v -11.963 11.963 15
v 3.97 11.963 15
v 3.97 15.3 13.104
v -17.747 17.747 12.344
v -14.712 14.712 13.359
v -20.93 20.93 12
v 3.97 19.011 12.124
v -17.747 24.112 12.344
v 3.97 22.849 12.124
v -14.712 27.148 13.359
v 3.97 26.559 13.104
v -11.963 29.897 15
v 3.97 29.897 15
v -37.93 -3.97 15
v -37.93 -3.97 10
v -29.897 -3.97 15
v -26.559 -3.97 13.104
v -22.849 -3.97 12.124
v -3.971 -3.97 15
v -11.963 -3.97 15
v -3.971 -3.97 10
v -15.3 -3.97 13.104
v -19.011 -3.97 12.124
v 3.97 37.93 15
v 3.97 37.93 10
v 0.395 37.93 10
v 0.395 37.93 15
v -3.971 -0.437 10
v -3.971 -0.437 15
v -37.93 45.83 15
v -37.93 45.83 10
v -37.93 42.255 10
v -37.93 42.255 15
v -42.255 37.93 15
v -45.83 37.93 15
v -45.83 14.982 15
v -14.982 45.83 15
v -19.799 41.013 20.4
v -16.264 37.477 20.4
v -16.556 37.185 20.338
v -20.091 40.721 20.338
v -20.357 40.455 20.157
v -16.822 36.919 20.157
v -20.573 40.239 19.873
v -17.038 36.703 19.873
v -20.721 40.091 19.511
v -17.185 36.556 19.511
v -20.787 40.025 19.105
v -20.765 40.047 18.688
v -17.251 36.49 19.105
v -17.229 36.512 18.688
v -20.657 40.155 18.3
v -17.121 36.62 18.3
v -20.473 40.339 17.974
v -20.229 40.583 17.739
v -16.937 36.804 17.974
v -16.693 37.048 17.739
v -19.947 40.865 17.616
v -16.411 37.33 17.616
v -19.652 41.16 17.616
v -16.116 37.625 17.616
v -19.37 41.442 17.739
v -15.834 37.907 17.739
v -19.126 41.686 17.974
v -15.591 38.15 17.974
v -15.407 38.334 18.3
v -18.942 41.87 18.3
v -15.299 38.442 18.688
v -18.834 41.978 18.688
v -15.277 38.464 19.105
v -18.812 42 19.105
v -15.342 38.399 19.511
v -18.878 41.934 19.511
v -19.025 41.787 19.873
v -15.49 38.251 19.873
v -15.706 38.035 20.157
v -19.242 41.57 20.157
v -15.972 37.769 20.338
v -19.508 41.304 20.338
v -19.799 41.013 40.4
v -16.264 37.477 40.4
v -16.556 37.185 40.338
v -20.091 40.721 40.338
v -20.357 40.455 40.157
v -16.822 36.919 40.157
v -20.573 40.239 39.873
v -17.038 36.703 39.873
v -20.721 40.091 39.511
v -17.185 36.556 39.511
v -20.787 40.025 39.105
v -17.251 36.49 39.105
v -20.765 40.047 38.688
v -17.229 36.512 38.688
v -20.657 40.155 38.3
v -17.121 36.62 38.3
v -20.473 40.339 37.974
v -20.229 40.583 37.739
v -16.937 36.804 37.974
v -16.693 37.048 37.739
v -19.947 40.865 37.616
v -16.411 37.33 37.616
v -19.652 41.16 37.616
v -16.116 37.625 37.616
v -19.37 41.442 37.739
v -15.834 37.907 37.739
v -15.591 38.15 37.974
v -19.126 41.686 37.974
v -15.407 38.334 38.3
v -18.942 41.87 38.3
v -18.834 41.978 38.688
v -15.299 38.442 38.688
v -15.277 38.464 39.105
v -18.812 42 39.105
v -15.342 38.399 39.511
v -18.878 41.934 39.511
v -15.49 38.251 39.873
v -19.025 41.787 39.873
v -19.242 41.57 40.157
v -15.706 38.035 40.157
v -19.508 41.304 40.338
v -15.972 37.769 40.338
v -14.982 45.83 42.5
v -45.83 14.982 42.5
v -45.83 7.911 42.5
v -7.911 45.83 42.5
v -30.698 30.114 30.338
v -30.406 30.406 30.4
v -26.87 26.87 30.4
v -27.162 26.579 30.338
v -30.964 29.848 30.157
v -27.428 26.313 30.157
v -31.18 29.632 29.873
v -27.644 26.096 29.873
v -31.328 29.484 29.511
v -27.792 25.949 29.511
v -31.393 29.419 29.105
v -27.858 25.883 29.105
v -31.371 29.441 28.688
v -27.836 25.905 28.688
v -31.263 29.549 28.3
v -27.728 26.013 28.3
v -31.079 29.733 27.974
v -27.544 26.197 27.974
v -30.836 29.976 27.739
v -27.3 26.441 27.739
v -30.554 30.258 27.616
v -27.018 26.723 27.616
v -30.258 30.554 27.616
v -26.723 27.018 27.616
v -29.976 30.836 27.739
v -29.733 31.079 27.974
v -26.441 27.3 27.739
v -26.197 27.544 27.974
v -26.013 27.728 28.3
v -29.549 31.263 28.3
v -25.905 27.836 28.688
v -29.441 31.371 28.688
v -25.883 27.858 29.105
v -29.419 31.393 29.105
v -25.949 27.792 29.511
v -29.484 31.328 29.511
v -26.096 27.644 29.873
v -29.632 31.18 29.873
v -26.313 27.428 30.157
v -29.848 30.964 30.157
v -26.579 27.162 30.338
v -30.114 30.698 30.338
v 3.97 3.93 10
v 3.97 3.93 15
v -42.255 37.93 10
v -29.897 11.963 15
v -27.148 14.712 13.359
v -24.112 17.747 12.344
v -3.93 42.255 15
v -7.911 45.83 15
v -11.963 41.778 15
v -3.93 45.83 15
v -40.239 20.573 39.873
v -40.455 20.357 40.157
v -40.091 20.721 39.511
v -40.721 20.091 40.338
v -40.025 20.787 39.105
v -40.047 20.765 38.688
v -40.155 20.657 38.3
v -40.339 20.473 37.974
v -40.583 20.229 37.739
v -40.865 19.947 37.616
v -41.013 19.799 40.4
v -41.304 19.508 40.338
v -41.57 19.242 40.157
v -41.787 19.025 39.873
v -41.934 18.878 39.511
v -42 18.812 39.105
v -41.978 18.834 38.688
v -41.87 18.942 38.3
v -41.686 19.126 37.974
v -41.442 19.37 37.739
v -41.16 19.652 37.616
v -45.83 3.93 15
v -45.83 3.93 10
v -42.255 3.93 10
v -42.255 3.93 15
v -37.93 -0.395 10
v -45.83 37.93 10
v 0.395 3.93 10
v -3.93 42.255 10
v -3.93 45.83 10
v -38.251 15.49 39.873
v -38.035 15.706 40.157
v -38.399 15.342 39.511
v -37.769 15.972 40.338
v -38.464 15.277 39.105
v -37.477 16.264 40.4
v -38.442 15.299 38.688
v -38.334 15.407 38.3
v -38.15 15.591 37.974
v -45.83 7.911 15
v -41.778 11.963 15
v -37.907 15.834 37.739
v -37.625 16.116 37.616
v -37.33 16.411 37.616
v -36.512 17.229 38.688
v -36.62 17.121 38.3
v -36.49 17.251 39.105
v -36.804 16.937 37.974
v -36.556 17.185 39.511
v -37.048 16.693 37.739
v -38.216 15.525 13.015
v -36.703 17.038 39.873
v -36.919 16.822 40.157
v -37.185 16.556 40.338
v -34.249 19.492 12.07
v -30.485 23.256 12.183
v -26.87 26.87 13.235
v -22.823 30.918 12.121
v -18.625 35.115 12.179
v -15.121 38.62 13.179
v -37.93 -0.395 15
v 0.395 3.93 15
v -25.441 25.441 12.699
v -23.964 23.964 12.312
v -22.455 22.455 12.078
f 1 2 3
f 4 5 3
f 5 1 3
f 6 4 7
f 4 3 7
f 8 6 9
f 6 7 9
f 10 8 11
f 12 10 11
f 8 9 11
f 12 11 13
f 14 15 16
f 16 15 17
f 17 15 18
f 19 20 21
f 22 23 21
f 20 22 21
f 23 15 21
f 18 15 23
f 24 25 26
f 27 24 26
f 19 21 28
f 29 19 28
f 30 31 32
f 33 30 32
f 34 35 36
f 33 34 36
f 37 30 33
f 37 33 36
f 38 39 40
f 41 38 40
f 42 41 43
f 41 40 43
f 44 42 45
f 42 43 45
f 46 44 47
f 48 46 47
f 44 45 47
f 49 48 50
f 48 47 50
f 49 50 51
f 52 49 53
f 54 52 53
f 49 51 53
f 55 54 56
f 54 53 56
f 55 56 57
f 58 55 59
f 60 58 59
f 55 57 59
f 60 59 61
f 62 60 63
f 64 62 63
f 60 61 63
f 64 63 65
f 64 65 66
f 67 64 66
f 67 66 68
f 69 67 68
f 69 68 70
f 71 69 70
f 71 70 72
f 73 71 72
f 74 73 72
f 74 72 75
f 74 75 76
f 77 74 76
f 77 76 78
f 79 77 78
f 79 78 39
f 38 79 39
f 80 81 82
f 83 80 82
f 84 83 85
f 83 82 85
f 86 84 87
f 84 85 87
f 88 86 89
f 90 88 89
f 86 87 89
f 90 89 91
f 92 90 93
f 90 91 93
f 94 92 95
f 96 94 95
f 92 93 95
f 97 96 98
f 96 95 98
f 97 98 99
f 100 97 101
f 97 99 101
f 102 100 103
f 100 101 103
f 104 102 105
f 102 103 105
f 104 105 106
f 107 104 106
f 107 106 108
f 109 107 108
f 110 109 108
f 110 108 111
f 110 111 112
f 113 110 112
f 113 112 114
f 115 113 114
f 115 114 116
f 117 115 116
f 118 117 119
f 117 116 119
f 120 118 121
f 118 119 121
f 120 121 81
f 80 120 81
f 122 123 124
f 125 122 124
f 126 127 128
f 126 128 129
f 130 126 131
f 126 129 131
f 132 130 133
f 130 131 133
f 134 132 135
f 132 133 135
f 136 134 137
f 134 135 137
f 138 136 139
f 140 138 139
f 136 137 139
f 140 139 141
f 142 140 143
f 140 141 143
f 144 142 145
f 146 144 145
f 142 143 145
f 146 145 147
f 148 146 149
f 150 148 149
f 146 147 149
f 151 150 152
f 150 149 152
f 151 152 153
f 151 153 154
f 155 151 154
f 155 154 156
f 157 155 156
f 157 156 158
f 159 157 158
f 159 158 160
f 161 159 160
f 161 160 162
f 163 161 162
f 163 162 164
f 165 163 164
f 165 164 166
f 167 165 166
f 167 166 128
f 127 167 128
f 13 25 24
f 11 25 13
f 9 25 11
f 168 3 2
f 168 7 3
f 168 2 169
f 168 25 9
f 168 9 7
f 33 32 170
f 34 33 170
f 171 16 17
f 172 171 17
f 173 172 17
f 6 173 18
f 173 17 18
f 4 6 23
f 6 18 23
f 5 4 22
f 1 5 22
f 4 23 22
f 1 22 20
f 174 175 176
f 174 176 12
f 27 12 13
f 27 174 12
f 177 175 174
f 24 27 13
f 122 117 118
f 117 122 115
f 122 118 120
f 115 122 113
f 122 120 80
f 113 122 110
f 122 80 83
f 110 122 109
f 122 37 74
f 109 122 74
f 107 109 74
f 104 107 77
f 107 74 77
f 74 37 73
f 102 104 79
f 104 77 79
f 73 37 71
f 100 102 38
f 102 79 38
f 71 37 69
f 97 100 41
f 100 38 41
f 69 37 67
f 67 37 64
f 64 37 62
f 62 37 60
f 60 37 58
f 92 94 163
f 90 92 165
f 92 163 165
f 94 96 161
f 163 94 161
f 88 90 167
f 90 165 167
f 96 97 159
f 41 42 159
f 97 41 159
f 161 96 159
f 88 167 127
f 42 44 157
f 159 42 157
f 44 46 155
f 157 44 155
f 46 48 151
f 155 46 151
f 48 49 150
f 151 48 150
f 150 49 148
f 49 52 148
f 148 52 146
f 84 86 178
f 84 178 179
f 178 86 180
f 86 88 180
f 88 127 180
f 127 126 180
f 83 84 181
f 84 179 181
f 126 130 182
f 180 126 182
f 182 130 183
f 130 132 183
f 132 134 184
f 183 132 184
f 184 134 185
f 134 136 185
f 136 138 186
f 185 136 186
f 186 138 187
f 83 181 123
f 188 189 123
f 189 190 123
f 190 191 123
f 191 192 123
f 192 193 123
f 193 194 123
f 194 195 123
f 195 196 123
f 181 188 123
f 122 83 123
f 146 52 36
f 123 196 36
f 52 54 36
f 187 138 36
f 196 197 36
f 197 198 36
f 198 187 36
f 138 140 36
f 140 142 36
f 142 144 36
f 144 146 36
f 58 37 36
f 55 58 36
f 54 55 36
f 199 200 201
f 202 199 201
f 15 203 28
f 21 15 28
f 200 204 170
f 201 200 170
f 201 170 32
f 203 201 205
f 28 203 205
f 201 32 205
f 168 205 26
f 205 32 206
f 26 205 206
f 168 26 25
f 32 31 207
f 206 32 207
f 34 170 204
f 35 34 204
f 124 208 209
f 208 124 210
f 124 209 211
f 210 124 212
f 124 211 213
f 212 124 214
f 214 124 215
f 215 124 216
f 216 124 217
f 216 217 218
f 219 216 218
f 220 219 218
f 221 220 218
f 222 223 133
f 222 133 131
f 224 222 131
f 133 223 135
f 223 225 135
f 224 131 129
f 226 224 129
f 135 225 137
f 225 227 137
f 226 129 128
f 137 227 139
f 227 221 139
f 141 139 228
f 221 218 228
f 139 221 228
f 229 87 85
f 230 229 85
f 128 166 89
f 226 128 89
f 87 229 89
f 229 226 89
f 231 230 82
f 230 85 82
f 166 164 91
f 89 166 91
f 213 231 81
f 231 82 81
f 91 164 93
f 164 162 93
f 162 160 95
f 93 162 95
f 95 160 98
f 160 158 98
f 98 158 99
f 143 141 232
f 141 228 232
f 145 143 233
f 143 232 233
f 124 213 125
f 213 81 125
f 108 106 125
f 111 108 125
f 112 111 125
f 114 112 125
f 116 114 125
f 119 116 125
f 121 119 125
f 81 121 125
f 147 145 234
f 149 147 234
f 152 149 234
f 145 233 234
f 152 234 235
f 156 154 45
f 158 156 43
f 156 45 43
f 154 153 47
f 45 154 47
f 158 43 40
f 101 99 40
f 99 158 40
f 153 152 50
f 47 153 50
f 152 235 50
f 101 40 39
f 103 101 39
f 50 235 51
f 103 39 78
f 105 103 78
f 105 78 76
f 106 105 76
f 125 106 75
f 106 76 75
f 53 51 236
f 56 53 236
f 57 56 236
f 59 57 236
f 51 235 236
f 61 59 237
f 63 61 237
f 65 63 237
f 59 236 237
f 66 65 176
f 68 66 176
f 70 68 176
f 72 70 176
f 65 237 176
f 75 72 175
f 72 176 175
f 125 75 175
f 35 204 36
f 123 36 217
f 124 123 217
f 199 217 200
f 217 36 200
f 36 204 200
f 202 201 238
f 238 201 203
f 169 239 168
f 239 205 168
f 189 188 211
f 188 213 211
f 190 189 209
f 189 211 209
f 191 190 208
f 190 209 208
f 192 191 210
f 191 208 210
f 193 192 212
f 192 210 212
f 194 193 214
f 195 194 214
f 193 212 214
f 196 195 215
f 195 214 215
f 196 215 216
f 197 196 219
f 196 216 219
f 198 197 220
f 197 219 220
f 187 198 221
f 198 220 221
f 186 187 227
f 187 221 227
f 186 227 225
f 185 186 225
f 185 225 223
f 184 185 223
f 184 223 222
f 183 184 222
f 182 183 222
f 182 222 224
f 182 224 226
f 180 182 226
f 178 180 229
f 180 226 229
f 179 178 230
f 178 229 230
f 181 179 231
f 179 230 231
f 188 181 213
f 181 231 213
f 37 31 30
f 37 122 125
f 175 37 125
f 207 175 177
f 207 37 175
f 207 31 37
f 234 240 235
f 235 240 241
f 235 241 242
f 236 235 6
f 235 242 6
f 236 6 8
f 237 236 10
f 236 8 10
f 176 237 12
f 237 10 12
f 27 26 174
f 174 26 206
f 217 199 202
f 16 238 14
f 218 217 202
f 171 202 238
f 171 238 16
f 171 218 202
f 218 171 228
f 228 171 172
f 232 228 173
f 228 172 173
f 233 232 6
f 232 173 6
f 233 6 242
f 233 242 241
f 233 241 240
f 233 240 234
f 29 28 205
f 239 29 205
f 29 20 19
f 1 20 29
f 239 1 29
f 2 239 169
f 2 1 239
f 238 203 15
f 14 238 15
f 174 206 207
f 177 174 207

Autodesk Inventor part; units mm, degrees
ref_plane "Work Plane1" through (0, 0, 10) normal (0, 0, 1) x (1, 0, 0)
sketch "Sketch1" plane through (0, 0, 10) normal (0, 0, 1) x (1, 0, 0)
  line L0 (-4.0299, -0.3538) -> (-2.2322, 1.4439) construction
  arc A0 (-1.4439, 2.2322) -> (-2.2322, 1.4439) centre (-0.9299, 0.9299) ccw construction
  line L1 (-1.4439, 2.2322) -> (0.3538, 4.0299) construction
  line L2 (-37.8299, 42.8299) -> (-37.8299, 37.8299) construction
  line L3 (-37.8299, 37.8299) -> (-42.9208, 37.8299) construction
  line L4 (-37.8299, 42.2137) -> (-37.8299, 45.8299) construction
  line L5 (-37.8299, 45.8299) -> (-4.0299, 45.8299) construction
  line L6 (-4.0299, 45.8299) -> (-4.0299, 42.2137) construction
  line L7 (-4.0299, 4.0299) -> (0.3538, 4.0299) projected
  circle A1 centre (-20.9299, 20.9299) radius 17.5 projected
  line L8 (-20.9299, 58.9723) -> (17.1124, 20.9299) construction
  line L9 (17.1124, 20.9299) -> (-20.9299, -17.1124) construction
  line L10 (-20.9299, -17.1124) -> (-58.9723, 20.9299) construction
  line L11 (-58.9723, 20.9299) -> (-20.9299, 58.9723) construction
  line L12 (-20.9299, 58.9723) -> (-20.9299, -17.1124) construction
  line L13 (17.1124, 20.9299) -> (-58.9723, 20.9299) construction
  line L14 (-20.9299, 58.9723) -> (32.8701, 58.9723) construction
  line L15 (-43.4299, 43.4299) -> (1.5701, 43.4299) construction
  line L16 (1.5701, 43.4299) -> (1.5701, -1.5701) construction
  line L17 (1.5701, -1.5701) -> (-43.4299, -1.5701) construction
  line L18 (-43.4299, -1.5701) -> (-43.4299, 43.4299) construction
  line L19 (-43.4299, 43.4299) -> (1.5701, -1.5701) construction
  line L20 (1.5701, 43.4299) -> (-43.4299, -1.5701) construction
  line L21 (-43.4299, 5.3876) -> (-43.4299, 36.4723)
  line L22 (-43.4299, 36.4723) -> (-36.4723, 43.4299)
  line L23 (-36.4723, 43.4299) -> (-5.3876, 43.4299)
  line L24 (-5.3876, 43.4299) -> (1.5701, 36.4723)
  line L25 (1.5701, 36.4723) -> (1.5701, 5.3876)
  line L26 (1.5701, 5.3876) -> (-5.3876, -1.5701)
  line L27 (-5.3876, -1.5701) -> (-36.4723, -1.5701)
  line L28 (-36.4723, -1.5701) -> (-43.4299, 5.3876)
  line L29 (-4.0299, 42.2137) -> (-37.8299, 42.2137) projected
  line L30 (-4.0299, -0.3538) -> (-4.0299, 4.0299) projected
  circle A2 centre (-20.9299, 20.9299) radius 1.4
  line L31 (-10.9299, 10.9299) -> (-30.9299, 10.9299) construction
  line L32 (-30.9299, 10.9299) -> (-30.9299, 30.9299) construction
  line L33 (-30.9299, 30.9299) -> (-10.9299, 30.9299) construction
  line L34 (-10.9299, 30.9299) -> (-10.9299, 10.9299) construction
  line L35 (-10.9299, 10.9299) -> (-30.9299, 30.9299) construction
  line L36 (-30.9299, 10.9299) -> (-10.9299, 30.9299) construction
  circle A3 centre (-30.9299, 30.9299) radius 1.4
  circle A4 centre (-30.9299, 10.9299) radius 1.4
  circle A5 centre (-10.9299, 10.9299) radius 1.4
  line L37 (-45.8299, 37.8299) -> (-42.0723, 37.8299) construction
  line L38 (-42.1723, 37.7299) -> (-45.8299, 37.7299)
  line L39 (-45.8299, 37.7299) -> (-45.8299, 4.1299)
  line L40 (-45.8299, 4.1299) -> (-42.1723, 4.1299)
  line L41 (-42.1723, 4.1299) -> (-42.1723, 37.7299)
  line L42 (-45.8299, 4.0299) -> (-42.0723, 4.0299) construction
  line L43 (-45.8299, 37.8299) -> (-42.0723, 37.8299) projected
  line L44 (-37.7299, 45.8299) -> (-4.1299, 45.8299)
  line L45 (-4.1299, 45.8299) -> (-4.1299, 42.1723)
  line L46 (-4.1299, 42.1723) -> (-37.7299, 42.1723)
  line L47 (-37.7299, 42.1723) -> (-37.7299, 45.8299)
  line L48 (0.4701, 37.8299) -> (0.4701, 4.0299) construction
  line L49 (0.4701, 4.0299) -> (3.9701, 4.0299) construction
  line L50 (3.9701, 37.8299) -> (3.9701, 4.0299) construction
  line L51 (0.4701, 37.8299) -> (3.9701, 37.8299) construction
  line L52 (-45.8299, -3.9701) -> (-4.0299, -3.9701) construction
  line L53 (0.3124, 37.7299) -> (3.9701, 37.7299)
  line L54 (3.9701, 37.7299) -> (3.9701, 4.1299)
  line L55 (3.9701, 4.1299) -> (0.3124, 4.1299)
  line L56 (0.3124, 4.1299) -> (0.3124, 37.7299)
  line L57 (-4.1713, -0.3538) -> (-37.7299, -0.3538)
  line L58 (-37.7299, -0.3538) -> (-37.7299, -3.9701)
  line L59 (-37.7299, -3.9701) -> (-4.1713, -3.9701)
  line L60 (-4.1713, -3.9701) -> (-4.1713, -0.3538)
  point P0 (-37.8299, 4.0299)
  dimension "d18" = 53.8
  dimension "d19" = 45
  dimension "d20" = 53.8
  dimension "d21" = 45
  dimension "d22" = 45
  dimension "d30" = 20
  dimension "d31" = 20
  dimension "d32" = 2.8
  dimension "d33" = 2.8
  dimension "d34" = 2.8
  dimension "d35" = 2.8
  dimension "d36" = 0.1
  dimension "d37" = 0.1
  dimension "d38" = 0.1
  dimension "d39" = 0.1
extrude "Extrusion1" add sketch "Sketch1" along normal blind 5 contours L30 L26 L57 L28 L41 L22 L46 L24 L56 L7 | L7 L26 L30 | L56 L24 L25 L26 | L26 L25 L24 L53 L54 L55 | L60 L59 L58 L57 L28 L27 L26 | L26 L27 L28 L57 | L46 L22 L29 L24 | L24 L29 L45 | L40 L39 L38 L22 L21 L28 | L28 L21 L22 L41 | L29 L22 L23 L24 | L24 L23 L22 L29 L47 L44 L45 | L47 L29 L22 | A1 | A2 | A3 | A4 | A5
sketch "Sketch4" plane through (0, 0, 15) normal (0, 0, 1) x (1, 0, 0)
  line L0 (-37.7299, 42.1723) -> (-42.1723, 37.7299) projected
  line L1 (-42.1723, 37.7299) -> (-45.8299, 37.7299) projected
  line L2 (-45.8299, 37.7299) -> (-45.8299, 4.1299) projected
  line L3 (-45.8299, 4.1299) -> (-42.1723, 4.1299) projected
  line L4 (-42.1723, 4.1299) -> (-37.6885, -0.3538) projected
  line L5 (-37.6885, -0.3538) -> (-37.7299, -0.3538) projected
  line L6 (-37.7299, -0.3538) -> (-37.7299, -3.9701) projected
  line L7 (-37.7299, -3.9701) -> (-4.1713, -3.9701) projected
  line L8 (-4.1713, -3.9701) -> (-4.1713, -0.3538) projected
  line L9 (-4.1713, -0.3538) -> (0.3124, 4.1299) projected
  line L10 (0.3124, 4.1299) -> (3.9701, 4.1299) projected
  line L11 (3.9701, 4.1299) -> (3.9701, 37.7299) projected
  line L12 (3.9701, 37.7299) -> (0.3124, 37.7299) projected
  line L13 (0.3124, 37.7299) -> (-4.1299, 42.1723) projected
  line L14 (-4.1299, 42.1723) -> (-4.1299, 45.8299) projected
  line L15 (-4.1299, 45.8299) -> (-37.7299, 45.8299) projected
  line L16 (-37.7299, 45.8299) -> (-37.7299, 42.1723) projected
  line L17 (-45.8299, 37.7299) -> (-45.8299, 4.1299) projected
  line L18 (-45.8299, 7.911) -> (-7.911, 45.8299)
  line L19 (-45.8299, 7.911) -> (7.7955, 7.911) construction
  line L20 (-7.911, 45.8299) -> (-14.9821, 45.8299)
  line L21 (-4.1299, 45.8299) -> (-37.7299, 45.8299) projected
  line L22 (-14.9821, 45.8299) -> (-45.8299, 14.9821)
  line L23 (-45.8299, 7.911) -> (-45.8299, 14.9821)
  circle A0 centre (-40.9299, 0.9299) radius 1.1933 projected
  line L24 (0.3124, 37.7299) -> (-4.1299, 42.1723) projected
  point P0 (0, 0)
  dimension "d40" = 45
  dimension "d41" = 5
extrude "Extrusion4" add sketch "Sketch4" along normal blind 27.5 contours L15 L18 L2 L22
sketch "Sketch5" plane through (-45.8299, 14.9821, 15) normal (-0.7071068, 0.7071068, 0) x (-0.7071068, -0.7071068, 0)
  line L0 (0, 0) -> (-43.6254, 0) projected
  line L1 (0, 0) -> (0, 27.5) projected
  line L2 (-43.6254, 27.5) -> (0, 27.5) projected
  line L3 (-43.6254, 0) -> (-43.6254, 27.5) projected
  circle A0 centre (-21.8127, 5.6873) radius 21.8127
  line L4 (-6.8127, 24) -> (-36.8127, 24) construction
  line L5 (-36.8127, 24) -> (-36.8127, 4) construction
  line L6 (-36.8127, 4) -> (-6.8127, 4) construction
  line L7 (-6.8127, 4) -> (-6.8127, 24) construction
  line L8 (-6.8127, 24) -> (-36.8127, 4) construction
  line L9 (-36.8127, 24) -> (-6.8127, 4) construction
  point P0 (-21.8127, -15)
  point P1 (-21.8127, 14)
  dimension "d44" = 30
  dimension "d45" = 20
hole "Hole1" at (-19.7994, 41.0126, 39) at (-19.7994, 41.0126, 19) at (-41.0126, 19.7994, 39) at (-30.406, 30.406, 29) direction (0.7071068, -0.7071068, 0) diameter 2.8 depth 12
sketch "Sketch6" plane through (-37.7299, -3.9701, 10) normal (0, -1, 0) x (1, 0, 0)
  circle A0 centre (-3.2, 36.9) radius 1.45 projected
  circle A1 centre (36.8, 36.9) radius 1.45 projected
  line L0 (-6.1, 0) -> (-6.1, 39.8) projected
  line L1 (-0.1, 0) -> (-6.1, 0) projected
  line L2 (-0.1, 33.8) -> (-0.1, 0) projected
  line L3 (33.7, 33.8) -> (-0.1, 33.8) projected
  line L4 (33.7, 33.8) -> (33.7, 0) projected
  line L5 (39.7, 0) -> (33.7, 0) projected
  line L6 (39.7, 39.8) -> (39.7, 0) projected
  line L7 (-6.1, 39.8) -> (39.7, 39.8) projected
  circle A2 centre (16.8, 16.9) radius 16.9
  circle A3 centre (16.8, 16.9) radius 14.9
  line L8 (-0.1, 16.9) -> (-0.1, 0)
  line L9 (0, 0) -> (33.5586, 0) projected
  line L10 (0.0414, 0) -> (-4.4423, 0) projected
  line L11 (33.5586, 0) -> (0.0414, 0)
  line L12 (33.7, 16.9) -> (33.5586, 0)
  point P0 (37.7299, -10)
  dimension "d53" = 2
extrude "Extrusion5" cut sketch "Sketch6" against normal up to surface contours A3 surface through (-45.8299, 7.911, 15) normal (0.7071068, -0.7071068, 0)
ref_plane "Work Plane3" through (3.9701, 45.8299, 26) normal (1, 0, 0) x (0, -1, 0)
sketch "Sketch7" plane through (3.9701, 45.8299, 26) normal (1, 0, 0) x (0, -1, 0)
  line L0 (41.8, -17.8) -> (41.8, 16)
  line L1 (8, -17.8) -> (41.8, -17.8)
  line L2 (8, -17.8) -> (8, 16)
  circle A0 centre (24.9, -0.9) radius 16.9
  circle A1 centre (24.9, -0.9) radius 14.9
  point P0 (45.8299, 26)
  dimension "d56" = 2
ref_plane "Work Plane4" through (-34.8055, 8.3289, 16.6138) normal (0.7071068, -0.7071068, 0) x (0.7071068, 0.7071068, 0)
extrude "Extrusion6" cut sketch "Sketch7" against normal up to surface contours A1 surface through (-45.8299, 7.911, 15) normal (0.7071068, -0.7071068, 0)
sketch "Skizze8" plane through (0, 0, 10) normal (0, 0, -1) x (-1, 0, 0)
  line L0 (42.1723, 37.7299) -> (37.7299, 42.1723) projected
  line L1 (37.7299, 45.8299) -> (37.7299, 42.1723) projected
  line L2 (4.1299, 45.8299) -> (37.7299, 45.8299) construction
  line L3 (4.1299, 42.1723) -> (4.1299, 45.8299) projected
  line L4 (4.1299, 42.1723) -> (-0.3124, 37.7299) projected
  line L5 (-3.9701, 37.7299) -> (-0.3124, 37.7299) projected
  line L6 (-3.9701, 4.1299) -> (-3.9701, 37.7299) construction
  line L7 (-0.3124, 4.1299) -> (-3.9701, 4.1299) projected
  line L8 (-0.3124, 4.1299) -> (4.1713, -0.3538) projected
  line L9 (4.1713, -3.9701) -> (4.1713, -0.3538) projected
  line L10 (37.7299, -3.9701) -> (4.1713, -3.9701) construction
  line L11 (37.7299, -0.3538) -> (37.7299, -3.9701) projected
  line L12 (37.6885, -0.3538) -> (37.7299, -0.3538) projected
  line L13 (37.6885, -0.3538) -> (42.1723, 4.1299) projected
  line L14 (45.8299, 4.1299) -> (42.1723, 4.1299) projected
  line L15 (45.8299, 37.7299) -> (45.8299, 4.1299) construction
  line L16 (42.1723, 37.7299) -> (45.8299, 37.7299) projected
  line L17 (46.0299, 3.9299) -> (42.2551, 3.9299)
  line L18 (42.2551, 3.9299) -> (37.9299, -0.3953)
  line L19 (37.9299, -0.3953) -> (37.9299, -4.1701)
  line L20 (37.9299, -4.1701) -> (3.9713, -4.1701) construction
  line L21 (3.9713, -4.1701) -> (3.9713, -0.4367)
  line L22 (3.9713, -0.4367) -> (-0.3953, 3.9299)
  line L23 (-0.3953, 3.9299) -> (-4.1701, 3.9299)
  line L24 (-4.1701, 3.9299) -> (-4.1701, 37.9299) construction
  line L25 (-4.1701, 37.9299) -> (-0.3953, 37.9299)
  line L26 (-0.3953, 37.9299) -> (3.9299, 42.2551)
  line L27 (3.9299, 42.2551) -> (3.9299, 46.0299)
  line L28 (3.9299, 46.0299) -> (37.9299, 46.0299) construction
  line L29 (37.9299, 46.0299) -> (37.9299, 42.2551)
  line L30 (37.9299, 42.2551) -> (42.2551, 37.9299)
  line L31 (42.2551, 37.9299) -> (46.0299, 37.9299)
  line L32 (46.0299, 37.9299) -> (46.0299, 3.9299) construction
  line L33 (37.7299, 45.8299) -> (37.7299, 42.1723) projected
  line L34 (37.7299, 45.8299) -> (37.9299, 45.8299)
  line L35 (42.1723, 37.7299) -> (45.8299, 37.7299) projected
  line L36 (45.8299, 37.7299) -> (45.8299, 37.9299)
  line L37 (45.8299, 4.1299) -> (45.8299, 3.9299)
  line L38 (37.7299, -3.9701) -> (4.1713, -3.9701) projected
  line L39 (37.7299, -3.9701) -> (37.9299, -3.9701)
  line L40 (4.1713, -3.9701) -> (3.9713, -3.9701)
  line L41 (-3.9701, 4.1299) -> (-3.9701, 3.9299)
  line L42 (-3.9701, 37.7299) -> (-0.3124, 37.7299) projected
  line L43 (-3.9701, 37.7299) -> (-3.9701, 37.9299)
  line L44 (4.1299, 42.1723) -> (4.1299, 45.8299) projected
  line L45 (4.1299, 45.8299) -> (3.9299, 45.8299)
  point P0 (0, 0)
  dimension "d59" = 0.2
extrude "IM_offset" add sketch "Skizze8" against normal up to surface (5 mm away)
properties part number "20_Cube_Insert_Kinematic_Mirrormount_45_base_v3_aaa"
